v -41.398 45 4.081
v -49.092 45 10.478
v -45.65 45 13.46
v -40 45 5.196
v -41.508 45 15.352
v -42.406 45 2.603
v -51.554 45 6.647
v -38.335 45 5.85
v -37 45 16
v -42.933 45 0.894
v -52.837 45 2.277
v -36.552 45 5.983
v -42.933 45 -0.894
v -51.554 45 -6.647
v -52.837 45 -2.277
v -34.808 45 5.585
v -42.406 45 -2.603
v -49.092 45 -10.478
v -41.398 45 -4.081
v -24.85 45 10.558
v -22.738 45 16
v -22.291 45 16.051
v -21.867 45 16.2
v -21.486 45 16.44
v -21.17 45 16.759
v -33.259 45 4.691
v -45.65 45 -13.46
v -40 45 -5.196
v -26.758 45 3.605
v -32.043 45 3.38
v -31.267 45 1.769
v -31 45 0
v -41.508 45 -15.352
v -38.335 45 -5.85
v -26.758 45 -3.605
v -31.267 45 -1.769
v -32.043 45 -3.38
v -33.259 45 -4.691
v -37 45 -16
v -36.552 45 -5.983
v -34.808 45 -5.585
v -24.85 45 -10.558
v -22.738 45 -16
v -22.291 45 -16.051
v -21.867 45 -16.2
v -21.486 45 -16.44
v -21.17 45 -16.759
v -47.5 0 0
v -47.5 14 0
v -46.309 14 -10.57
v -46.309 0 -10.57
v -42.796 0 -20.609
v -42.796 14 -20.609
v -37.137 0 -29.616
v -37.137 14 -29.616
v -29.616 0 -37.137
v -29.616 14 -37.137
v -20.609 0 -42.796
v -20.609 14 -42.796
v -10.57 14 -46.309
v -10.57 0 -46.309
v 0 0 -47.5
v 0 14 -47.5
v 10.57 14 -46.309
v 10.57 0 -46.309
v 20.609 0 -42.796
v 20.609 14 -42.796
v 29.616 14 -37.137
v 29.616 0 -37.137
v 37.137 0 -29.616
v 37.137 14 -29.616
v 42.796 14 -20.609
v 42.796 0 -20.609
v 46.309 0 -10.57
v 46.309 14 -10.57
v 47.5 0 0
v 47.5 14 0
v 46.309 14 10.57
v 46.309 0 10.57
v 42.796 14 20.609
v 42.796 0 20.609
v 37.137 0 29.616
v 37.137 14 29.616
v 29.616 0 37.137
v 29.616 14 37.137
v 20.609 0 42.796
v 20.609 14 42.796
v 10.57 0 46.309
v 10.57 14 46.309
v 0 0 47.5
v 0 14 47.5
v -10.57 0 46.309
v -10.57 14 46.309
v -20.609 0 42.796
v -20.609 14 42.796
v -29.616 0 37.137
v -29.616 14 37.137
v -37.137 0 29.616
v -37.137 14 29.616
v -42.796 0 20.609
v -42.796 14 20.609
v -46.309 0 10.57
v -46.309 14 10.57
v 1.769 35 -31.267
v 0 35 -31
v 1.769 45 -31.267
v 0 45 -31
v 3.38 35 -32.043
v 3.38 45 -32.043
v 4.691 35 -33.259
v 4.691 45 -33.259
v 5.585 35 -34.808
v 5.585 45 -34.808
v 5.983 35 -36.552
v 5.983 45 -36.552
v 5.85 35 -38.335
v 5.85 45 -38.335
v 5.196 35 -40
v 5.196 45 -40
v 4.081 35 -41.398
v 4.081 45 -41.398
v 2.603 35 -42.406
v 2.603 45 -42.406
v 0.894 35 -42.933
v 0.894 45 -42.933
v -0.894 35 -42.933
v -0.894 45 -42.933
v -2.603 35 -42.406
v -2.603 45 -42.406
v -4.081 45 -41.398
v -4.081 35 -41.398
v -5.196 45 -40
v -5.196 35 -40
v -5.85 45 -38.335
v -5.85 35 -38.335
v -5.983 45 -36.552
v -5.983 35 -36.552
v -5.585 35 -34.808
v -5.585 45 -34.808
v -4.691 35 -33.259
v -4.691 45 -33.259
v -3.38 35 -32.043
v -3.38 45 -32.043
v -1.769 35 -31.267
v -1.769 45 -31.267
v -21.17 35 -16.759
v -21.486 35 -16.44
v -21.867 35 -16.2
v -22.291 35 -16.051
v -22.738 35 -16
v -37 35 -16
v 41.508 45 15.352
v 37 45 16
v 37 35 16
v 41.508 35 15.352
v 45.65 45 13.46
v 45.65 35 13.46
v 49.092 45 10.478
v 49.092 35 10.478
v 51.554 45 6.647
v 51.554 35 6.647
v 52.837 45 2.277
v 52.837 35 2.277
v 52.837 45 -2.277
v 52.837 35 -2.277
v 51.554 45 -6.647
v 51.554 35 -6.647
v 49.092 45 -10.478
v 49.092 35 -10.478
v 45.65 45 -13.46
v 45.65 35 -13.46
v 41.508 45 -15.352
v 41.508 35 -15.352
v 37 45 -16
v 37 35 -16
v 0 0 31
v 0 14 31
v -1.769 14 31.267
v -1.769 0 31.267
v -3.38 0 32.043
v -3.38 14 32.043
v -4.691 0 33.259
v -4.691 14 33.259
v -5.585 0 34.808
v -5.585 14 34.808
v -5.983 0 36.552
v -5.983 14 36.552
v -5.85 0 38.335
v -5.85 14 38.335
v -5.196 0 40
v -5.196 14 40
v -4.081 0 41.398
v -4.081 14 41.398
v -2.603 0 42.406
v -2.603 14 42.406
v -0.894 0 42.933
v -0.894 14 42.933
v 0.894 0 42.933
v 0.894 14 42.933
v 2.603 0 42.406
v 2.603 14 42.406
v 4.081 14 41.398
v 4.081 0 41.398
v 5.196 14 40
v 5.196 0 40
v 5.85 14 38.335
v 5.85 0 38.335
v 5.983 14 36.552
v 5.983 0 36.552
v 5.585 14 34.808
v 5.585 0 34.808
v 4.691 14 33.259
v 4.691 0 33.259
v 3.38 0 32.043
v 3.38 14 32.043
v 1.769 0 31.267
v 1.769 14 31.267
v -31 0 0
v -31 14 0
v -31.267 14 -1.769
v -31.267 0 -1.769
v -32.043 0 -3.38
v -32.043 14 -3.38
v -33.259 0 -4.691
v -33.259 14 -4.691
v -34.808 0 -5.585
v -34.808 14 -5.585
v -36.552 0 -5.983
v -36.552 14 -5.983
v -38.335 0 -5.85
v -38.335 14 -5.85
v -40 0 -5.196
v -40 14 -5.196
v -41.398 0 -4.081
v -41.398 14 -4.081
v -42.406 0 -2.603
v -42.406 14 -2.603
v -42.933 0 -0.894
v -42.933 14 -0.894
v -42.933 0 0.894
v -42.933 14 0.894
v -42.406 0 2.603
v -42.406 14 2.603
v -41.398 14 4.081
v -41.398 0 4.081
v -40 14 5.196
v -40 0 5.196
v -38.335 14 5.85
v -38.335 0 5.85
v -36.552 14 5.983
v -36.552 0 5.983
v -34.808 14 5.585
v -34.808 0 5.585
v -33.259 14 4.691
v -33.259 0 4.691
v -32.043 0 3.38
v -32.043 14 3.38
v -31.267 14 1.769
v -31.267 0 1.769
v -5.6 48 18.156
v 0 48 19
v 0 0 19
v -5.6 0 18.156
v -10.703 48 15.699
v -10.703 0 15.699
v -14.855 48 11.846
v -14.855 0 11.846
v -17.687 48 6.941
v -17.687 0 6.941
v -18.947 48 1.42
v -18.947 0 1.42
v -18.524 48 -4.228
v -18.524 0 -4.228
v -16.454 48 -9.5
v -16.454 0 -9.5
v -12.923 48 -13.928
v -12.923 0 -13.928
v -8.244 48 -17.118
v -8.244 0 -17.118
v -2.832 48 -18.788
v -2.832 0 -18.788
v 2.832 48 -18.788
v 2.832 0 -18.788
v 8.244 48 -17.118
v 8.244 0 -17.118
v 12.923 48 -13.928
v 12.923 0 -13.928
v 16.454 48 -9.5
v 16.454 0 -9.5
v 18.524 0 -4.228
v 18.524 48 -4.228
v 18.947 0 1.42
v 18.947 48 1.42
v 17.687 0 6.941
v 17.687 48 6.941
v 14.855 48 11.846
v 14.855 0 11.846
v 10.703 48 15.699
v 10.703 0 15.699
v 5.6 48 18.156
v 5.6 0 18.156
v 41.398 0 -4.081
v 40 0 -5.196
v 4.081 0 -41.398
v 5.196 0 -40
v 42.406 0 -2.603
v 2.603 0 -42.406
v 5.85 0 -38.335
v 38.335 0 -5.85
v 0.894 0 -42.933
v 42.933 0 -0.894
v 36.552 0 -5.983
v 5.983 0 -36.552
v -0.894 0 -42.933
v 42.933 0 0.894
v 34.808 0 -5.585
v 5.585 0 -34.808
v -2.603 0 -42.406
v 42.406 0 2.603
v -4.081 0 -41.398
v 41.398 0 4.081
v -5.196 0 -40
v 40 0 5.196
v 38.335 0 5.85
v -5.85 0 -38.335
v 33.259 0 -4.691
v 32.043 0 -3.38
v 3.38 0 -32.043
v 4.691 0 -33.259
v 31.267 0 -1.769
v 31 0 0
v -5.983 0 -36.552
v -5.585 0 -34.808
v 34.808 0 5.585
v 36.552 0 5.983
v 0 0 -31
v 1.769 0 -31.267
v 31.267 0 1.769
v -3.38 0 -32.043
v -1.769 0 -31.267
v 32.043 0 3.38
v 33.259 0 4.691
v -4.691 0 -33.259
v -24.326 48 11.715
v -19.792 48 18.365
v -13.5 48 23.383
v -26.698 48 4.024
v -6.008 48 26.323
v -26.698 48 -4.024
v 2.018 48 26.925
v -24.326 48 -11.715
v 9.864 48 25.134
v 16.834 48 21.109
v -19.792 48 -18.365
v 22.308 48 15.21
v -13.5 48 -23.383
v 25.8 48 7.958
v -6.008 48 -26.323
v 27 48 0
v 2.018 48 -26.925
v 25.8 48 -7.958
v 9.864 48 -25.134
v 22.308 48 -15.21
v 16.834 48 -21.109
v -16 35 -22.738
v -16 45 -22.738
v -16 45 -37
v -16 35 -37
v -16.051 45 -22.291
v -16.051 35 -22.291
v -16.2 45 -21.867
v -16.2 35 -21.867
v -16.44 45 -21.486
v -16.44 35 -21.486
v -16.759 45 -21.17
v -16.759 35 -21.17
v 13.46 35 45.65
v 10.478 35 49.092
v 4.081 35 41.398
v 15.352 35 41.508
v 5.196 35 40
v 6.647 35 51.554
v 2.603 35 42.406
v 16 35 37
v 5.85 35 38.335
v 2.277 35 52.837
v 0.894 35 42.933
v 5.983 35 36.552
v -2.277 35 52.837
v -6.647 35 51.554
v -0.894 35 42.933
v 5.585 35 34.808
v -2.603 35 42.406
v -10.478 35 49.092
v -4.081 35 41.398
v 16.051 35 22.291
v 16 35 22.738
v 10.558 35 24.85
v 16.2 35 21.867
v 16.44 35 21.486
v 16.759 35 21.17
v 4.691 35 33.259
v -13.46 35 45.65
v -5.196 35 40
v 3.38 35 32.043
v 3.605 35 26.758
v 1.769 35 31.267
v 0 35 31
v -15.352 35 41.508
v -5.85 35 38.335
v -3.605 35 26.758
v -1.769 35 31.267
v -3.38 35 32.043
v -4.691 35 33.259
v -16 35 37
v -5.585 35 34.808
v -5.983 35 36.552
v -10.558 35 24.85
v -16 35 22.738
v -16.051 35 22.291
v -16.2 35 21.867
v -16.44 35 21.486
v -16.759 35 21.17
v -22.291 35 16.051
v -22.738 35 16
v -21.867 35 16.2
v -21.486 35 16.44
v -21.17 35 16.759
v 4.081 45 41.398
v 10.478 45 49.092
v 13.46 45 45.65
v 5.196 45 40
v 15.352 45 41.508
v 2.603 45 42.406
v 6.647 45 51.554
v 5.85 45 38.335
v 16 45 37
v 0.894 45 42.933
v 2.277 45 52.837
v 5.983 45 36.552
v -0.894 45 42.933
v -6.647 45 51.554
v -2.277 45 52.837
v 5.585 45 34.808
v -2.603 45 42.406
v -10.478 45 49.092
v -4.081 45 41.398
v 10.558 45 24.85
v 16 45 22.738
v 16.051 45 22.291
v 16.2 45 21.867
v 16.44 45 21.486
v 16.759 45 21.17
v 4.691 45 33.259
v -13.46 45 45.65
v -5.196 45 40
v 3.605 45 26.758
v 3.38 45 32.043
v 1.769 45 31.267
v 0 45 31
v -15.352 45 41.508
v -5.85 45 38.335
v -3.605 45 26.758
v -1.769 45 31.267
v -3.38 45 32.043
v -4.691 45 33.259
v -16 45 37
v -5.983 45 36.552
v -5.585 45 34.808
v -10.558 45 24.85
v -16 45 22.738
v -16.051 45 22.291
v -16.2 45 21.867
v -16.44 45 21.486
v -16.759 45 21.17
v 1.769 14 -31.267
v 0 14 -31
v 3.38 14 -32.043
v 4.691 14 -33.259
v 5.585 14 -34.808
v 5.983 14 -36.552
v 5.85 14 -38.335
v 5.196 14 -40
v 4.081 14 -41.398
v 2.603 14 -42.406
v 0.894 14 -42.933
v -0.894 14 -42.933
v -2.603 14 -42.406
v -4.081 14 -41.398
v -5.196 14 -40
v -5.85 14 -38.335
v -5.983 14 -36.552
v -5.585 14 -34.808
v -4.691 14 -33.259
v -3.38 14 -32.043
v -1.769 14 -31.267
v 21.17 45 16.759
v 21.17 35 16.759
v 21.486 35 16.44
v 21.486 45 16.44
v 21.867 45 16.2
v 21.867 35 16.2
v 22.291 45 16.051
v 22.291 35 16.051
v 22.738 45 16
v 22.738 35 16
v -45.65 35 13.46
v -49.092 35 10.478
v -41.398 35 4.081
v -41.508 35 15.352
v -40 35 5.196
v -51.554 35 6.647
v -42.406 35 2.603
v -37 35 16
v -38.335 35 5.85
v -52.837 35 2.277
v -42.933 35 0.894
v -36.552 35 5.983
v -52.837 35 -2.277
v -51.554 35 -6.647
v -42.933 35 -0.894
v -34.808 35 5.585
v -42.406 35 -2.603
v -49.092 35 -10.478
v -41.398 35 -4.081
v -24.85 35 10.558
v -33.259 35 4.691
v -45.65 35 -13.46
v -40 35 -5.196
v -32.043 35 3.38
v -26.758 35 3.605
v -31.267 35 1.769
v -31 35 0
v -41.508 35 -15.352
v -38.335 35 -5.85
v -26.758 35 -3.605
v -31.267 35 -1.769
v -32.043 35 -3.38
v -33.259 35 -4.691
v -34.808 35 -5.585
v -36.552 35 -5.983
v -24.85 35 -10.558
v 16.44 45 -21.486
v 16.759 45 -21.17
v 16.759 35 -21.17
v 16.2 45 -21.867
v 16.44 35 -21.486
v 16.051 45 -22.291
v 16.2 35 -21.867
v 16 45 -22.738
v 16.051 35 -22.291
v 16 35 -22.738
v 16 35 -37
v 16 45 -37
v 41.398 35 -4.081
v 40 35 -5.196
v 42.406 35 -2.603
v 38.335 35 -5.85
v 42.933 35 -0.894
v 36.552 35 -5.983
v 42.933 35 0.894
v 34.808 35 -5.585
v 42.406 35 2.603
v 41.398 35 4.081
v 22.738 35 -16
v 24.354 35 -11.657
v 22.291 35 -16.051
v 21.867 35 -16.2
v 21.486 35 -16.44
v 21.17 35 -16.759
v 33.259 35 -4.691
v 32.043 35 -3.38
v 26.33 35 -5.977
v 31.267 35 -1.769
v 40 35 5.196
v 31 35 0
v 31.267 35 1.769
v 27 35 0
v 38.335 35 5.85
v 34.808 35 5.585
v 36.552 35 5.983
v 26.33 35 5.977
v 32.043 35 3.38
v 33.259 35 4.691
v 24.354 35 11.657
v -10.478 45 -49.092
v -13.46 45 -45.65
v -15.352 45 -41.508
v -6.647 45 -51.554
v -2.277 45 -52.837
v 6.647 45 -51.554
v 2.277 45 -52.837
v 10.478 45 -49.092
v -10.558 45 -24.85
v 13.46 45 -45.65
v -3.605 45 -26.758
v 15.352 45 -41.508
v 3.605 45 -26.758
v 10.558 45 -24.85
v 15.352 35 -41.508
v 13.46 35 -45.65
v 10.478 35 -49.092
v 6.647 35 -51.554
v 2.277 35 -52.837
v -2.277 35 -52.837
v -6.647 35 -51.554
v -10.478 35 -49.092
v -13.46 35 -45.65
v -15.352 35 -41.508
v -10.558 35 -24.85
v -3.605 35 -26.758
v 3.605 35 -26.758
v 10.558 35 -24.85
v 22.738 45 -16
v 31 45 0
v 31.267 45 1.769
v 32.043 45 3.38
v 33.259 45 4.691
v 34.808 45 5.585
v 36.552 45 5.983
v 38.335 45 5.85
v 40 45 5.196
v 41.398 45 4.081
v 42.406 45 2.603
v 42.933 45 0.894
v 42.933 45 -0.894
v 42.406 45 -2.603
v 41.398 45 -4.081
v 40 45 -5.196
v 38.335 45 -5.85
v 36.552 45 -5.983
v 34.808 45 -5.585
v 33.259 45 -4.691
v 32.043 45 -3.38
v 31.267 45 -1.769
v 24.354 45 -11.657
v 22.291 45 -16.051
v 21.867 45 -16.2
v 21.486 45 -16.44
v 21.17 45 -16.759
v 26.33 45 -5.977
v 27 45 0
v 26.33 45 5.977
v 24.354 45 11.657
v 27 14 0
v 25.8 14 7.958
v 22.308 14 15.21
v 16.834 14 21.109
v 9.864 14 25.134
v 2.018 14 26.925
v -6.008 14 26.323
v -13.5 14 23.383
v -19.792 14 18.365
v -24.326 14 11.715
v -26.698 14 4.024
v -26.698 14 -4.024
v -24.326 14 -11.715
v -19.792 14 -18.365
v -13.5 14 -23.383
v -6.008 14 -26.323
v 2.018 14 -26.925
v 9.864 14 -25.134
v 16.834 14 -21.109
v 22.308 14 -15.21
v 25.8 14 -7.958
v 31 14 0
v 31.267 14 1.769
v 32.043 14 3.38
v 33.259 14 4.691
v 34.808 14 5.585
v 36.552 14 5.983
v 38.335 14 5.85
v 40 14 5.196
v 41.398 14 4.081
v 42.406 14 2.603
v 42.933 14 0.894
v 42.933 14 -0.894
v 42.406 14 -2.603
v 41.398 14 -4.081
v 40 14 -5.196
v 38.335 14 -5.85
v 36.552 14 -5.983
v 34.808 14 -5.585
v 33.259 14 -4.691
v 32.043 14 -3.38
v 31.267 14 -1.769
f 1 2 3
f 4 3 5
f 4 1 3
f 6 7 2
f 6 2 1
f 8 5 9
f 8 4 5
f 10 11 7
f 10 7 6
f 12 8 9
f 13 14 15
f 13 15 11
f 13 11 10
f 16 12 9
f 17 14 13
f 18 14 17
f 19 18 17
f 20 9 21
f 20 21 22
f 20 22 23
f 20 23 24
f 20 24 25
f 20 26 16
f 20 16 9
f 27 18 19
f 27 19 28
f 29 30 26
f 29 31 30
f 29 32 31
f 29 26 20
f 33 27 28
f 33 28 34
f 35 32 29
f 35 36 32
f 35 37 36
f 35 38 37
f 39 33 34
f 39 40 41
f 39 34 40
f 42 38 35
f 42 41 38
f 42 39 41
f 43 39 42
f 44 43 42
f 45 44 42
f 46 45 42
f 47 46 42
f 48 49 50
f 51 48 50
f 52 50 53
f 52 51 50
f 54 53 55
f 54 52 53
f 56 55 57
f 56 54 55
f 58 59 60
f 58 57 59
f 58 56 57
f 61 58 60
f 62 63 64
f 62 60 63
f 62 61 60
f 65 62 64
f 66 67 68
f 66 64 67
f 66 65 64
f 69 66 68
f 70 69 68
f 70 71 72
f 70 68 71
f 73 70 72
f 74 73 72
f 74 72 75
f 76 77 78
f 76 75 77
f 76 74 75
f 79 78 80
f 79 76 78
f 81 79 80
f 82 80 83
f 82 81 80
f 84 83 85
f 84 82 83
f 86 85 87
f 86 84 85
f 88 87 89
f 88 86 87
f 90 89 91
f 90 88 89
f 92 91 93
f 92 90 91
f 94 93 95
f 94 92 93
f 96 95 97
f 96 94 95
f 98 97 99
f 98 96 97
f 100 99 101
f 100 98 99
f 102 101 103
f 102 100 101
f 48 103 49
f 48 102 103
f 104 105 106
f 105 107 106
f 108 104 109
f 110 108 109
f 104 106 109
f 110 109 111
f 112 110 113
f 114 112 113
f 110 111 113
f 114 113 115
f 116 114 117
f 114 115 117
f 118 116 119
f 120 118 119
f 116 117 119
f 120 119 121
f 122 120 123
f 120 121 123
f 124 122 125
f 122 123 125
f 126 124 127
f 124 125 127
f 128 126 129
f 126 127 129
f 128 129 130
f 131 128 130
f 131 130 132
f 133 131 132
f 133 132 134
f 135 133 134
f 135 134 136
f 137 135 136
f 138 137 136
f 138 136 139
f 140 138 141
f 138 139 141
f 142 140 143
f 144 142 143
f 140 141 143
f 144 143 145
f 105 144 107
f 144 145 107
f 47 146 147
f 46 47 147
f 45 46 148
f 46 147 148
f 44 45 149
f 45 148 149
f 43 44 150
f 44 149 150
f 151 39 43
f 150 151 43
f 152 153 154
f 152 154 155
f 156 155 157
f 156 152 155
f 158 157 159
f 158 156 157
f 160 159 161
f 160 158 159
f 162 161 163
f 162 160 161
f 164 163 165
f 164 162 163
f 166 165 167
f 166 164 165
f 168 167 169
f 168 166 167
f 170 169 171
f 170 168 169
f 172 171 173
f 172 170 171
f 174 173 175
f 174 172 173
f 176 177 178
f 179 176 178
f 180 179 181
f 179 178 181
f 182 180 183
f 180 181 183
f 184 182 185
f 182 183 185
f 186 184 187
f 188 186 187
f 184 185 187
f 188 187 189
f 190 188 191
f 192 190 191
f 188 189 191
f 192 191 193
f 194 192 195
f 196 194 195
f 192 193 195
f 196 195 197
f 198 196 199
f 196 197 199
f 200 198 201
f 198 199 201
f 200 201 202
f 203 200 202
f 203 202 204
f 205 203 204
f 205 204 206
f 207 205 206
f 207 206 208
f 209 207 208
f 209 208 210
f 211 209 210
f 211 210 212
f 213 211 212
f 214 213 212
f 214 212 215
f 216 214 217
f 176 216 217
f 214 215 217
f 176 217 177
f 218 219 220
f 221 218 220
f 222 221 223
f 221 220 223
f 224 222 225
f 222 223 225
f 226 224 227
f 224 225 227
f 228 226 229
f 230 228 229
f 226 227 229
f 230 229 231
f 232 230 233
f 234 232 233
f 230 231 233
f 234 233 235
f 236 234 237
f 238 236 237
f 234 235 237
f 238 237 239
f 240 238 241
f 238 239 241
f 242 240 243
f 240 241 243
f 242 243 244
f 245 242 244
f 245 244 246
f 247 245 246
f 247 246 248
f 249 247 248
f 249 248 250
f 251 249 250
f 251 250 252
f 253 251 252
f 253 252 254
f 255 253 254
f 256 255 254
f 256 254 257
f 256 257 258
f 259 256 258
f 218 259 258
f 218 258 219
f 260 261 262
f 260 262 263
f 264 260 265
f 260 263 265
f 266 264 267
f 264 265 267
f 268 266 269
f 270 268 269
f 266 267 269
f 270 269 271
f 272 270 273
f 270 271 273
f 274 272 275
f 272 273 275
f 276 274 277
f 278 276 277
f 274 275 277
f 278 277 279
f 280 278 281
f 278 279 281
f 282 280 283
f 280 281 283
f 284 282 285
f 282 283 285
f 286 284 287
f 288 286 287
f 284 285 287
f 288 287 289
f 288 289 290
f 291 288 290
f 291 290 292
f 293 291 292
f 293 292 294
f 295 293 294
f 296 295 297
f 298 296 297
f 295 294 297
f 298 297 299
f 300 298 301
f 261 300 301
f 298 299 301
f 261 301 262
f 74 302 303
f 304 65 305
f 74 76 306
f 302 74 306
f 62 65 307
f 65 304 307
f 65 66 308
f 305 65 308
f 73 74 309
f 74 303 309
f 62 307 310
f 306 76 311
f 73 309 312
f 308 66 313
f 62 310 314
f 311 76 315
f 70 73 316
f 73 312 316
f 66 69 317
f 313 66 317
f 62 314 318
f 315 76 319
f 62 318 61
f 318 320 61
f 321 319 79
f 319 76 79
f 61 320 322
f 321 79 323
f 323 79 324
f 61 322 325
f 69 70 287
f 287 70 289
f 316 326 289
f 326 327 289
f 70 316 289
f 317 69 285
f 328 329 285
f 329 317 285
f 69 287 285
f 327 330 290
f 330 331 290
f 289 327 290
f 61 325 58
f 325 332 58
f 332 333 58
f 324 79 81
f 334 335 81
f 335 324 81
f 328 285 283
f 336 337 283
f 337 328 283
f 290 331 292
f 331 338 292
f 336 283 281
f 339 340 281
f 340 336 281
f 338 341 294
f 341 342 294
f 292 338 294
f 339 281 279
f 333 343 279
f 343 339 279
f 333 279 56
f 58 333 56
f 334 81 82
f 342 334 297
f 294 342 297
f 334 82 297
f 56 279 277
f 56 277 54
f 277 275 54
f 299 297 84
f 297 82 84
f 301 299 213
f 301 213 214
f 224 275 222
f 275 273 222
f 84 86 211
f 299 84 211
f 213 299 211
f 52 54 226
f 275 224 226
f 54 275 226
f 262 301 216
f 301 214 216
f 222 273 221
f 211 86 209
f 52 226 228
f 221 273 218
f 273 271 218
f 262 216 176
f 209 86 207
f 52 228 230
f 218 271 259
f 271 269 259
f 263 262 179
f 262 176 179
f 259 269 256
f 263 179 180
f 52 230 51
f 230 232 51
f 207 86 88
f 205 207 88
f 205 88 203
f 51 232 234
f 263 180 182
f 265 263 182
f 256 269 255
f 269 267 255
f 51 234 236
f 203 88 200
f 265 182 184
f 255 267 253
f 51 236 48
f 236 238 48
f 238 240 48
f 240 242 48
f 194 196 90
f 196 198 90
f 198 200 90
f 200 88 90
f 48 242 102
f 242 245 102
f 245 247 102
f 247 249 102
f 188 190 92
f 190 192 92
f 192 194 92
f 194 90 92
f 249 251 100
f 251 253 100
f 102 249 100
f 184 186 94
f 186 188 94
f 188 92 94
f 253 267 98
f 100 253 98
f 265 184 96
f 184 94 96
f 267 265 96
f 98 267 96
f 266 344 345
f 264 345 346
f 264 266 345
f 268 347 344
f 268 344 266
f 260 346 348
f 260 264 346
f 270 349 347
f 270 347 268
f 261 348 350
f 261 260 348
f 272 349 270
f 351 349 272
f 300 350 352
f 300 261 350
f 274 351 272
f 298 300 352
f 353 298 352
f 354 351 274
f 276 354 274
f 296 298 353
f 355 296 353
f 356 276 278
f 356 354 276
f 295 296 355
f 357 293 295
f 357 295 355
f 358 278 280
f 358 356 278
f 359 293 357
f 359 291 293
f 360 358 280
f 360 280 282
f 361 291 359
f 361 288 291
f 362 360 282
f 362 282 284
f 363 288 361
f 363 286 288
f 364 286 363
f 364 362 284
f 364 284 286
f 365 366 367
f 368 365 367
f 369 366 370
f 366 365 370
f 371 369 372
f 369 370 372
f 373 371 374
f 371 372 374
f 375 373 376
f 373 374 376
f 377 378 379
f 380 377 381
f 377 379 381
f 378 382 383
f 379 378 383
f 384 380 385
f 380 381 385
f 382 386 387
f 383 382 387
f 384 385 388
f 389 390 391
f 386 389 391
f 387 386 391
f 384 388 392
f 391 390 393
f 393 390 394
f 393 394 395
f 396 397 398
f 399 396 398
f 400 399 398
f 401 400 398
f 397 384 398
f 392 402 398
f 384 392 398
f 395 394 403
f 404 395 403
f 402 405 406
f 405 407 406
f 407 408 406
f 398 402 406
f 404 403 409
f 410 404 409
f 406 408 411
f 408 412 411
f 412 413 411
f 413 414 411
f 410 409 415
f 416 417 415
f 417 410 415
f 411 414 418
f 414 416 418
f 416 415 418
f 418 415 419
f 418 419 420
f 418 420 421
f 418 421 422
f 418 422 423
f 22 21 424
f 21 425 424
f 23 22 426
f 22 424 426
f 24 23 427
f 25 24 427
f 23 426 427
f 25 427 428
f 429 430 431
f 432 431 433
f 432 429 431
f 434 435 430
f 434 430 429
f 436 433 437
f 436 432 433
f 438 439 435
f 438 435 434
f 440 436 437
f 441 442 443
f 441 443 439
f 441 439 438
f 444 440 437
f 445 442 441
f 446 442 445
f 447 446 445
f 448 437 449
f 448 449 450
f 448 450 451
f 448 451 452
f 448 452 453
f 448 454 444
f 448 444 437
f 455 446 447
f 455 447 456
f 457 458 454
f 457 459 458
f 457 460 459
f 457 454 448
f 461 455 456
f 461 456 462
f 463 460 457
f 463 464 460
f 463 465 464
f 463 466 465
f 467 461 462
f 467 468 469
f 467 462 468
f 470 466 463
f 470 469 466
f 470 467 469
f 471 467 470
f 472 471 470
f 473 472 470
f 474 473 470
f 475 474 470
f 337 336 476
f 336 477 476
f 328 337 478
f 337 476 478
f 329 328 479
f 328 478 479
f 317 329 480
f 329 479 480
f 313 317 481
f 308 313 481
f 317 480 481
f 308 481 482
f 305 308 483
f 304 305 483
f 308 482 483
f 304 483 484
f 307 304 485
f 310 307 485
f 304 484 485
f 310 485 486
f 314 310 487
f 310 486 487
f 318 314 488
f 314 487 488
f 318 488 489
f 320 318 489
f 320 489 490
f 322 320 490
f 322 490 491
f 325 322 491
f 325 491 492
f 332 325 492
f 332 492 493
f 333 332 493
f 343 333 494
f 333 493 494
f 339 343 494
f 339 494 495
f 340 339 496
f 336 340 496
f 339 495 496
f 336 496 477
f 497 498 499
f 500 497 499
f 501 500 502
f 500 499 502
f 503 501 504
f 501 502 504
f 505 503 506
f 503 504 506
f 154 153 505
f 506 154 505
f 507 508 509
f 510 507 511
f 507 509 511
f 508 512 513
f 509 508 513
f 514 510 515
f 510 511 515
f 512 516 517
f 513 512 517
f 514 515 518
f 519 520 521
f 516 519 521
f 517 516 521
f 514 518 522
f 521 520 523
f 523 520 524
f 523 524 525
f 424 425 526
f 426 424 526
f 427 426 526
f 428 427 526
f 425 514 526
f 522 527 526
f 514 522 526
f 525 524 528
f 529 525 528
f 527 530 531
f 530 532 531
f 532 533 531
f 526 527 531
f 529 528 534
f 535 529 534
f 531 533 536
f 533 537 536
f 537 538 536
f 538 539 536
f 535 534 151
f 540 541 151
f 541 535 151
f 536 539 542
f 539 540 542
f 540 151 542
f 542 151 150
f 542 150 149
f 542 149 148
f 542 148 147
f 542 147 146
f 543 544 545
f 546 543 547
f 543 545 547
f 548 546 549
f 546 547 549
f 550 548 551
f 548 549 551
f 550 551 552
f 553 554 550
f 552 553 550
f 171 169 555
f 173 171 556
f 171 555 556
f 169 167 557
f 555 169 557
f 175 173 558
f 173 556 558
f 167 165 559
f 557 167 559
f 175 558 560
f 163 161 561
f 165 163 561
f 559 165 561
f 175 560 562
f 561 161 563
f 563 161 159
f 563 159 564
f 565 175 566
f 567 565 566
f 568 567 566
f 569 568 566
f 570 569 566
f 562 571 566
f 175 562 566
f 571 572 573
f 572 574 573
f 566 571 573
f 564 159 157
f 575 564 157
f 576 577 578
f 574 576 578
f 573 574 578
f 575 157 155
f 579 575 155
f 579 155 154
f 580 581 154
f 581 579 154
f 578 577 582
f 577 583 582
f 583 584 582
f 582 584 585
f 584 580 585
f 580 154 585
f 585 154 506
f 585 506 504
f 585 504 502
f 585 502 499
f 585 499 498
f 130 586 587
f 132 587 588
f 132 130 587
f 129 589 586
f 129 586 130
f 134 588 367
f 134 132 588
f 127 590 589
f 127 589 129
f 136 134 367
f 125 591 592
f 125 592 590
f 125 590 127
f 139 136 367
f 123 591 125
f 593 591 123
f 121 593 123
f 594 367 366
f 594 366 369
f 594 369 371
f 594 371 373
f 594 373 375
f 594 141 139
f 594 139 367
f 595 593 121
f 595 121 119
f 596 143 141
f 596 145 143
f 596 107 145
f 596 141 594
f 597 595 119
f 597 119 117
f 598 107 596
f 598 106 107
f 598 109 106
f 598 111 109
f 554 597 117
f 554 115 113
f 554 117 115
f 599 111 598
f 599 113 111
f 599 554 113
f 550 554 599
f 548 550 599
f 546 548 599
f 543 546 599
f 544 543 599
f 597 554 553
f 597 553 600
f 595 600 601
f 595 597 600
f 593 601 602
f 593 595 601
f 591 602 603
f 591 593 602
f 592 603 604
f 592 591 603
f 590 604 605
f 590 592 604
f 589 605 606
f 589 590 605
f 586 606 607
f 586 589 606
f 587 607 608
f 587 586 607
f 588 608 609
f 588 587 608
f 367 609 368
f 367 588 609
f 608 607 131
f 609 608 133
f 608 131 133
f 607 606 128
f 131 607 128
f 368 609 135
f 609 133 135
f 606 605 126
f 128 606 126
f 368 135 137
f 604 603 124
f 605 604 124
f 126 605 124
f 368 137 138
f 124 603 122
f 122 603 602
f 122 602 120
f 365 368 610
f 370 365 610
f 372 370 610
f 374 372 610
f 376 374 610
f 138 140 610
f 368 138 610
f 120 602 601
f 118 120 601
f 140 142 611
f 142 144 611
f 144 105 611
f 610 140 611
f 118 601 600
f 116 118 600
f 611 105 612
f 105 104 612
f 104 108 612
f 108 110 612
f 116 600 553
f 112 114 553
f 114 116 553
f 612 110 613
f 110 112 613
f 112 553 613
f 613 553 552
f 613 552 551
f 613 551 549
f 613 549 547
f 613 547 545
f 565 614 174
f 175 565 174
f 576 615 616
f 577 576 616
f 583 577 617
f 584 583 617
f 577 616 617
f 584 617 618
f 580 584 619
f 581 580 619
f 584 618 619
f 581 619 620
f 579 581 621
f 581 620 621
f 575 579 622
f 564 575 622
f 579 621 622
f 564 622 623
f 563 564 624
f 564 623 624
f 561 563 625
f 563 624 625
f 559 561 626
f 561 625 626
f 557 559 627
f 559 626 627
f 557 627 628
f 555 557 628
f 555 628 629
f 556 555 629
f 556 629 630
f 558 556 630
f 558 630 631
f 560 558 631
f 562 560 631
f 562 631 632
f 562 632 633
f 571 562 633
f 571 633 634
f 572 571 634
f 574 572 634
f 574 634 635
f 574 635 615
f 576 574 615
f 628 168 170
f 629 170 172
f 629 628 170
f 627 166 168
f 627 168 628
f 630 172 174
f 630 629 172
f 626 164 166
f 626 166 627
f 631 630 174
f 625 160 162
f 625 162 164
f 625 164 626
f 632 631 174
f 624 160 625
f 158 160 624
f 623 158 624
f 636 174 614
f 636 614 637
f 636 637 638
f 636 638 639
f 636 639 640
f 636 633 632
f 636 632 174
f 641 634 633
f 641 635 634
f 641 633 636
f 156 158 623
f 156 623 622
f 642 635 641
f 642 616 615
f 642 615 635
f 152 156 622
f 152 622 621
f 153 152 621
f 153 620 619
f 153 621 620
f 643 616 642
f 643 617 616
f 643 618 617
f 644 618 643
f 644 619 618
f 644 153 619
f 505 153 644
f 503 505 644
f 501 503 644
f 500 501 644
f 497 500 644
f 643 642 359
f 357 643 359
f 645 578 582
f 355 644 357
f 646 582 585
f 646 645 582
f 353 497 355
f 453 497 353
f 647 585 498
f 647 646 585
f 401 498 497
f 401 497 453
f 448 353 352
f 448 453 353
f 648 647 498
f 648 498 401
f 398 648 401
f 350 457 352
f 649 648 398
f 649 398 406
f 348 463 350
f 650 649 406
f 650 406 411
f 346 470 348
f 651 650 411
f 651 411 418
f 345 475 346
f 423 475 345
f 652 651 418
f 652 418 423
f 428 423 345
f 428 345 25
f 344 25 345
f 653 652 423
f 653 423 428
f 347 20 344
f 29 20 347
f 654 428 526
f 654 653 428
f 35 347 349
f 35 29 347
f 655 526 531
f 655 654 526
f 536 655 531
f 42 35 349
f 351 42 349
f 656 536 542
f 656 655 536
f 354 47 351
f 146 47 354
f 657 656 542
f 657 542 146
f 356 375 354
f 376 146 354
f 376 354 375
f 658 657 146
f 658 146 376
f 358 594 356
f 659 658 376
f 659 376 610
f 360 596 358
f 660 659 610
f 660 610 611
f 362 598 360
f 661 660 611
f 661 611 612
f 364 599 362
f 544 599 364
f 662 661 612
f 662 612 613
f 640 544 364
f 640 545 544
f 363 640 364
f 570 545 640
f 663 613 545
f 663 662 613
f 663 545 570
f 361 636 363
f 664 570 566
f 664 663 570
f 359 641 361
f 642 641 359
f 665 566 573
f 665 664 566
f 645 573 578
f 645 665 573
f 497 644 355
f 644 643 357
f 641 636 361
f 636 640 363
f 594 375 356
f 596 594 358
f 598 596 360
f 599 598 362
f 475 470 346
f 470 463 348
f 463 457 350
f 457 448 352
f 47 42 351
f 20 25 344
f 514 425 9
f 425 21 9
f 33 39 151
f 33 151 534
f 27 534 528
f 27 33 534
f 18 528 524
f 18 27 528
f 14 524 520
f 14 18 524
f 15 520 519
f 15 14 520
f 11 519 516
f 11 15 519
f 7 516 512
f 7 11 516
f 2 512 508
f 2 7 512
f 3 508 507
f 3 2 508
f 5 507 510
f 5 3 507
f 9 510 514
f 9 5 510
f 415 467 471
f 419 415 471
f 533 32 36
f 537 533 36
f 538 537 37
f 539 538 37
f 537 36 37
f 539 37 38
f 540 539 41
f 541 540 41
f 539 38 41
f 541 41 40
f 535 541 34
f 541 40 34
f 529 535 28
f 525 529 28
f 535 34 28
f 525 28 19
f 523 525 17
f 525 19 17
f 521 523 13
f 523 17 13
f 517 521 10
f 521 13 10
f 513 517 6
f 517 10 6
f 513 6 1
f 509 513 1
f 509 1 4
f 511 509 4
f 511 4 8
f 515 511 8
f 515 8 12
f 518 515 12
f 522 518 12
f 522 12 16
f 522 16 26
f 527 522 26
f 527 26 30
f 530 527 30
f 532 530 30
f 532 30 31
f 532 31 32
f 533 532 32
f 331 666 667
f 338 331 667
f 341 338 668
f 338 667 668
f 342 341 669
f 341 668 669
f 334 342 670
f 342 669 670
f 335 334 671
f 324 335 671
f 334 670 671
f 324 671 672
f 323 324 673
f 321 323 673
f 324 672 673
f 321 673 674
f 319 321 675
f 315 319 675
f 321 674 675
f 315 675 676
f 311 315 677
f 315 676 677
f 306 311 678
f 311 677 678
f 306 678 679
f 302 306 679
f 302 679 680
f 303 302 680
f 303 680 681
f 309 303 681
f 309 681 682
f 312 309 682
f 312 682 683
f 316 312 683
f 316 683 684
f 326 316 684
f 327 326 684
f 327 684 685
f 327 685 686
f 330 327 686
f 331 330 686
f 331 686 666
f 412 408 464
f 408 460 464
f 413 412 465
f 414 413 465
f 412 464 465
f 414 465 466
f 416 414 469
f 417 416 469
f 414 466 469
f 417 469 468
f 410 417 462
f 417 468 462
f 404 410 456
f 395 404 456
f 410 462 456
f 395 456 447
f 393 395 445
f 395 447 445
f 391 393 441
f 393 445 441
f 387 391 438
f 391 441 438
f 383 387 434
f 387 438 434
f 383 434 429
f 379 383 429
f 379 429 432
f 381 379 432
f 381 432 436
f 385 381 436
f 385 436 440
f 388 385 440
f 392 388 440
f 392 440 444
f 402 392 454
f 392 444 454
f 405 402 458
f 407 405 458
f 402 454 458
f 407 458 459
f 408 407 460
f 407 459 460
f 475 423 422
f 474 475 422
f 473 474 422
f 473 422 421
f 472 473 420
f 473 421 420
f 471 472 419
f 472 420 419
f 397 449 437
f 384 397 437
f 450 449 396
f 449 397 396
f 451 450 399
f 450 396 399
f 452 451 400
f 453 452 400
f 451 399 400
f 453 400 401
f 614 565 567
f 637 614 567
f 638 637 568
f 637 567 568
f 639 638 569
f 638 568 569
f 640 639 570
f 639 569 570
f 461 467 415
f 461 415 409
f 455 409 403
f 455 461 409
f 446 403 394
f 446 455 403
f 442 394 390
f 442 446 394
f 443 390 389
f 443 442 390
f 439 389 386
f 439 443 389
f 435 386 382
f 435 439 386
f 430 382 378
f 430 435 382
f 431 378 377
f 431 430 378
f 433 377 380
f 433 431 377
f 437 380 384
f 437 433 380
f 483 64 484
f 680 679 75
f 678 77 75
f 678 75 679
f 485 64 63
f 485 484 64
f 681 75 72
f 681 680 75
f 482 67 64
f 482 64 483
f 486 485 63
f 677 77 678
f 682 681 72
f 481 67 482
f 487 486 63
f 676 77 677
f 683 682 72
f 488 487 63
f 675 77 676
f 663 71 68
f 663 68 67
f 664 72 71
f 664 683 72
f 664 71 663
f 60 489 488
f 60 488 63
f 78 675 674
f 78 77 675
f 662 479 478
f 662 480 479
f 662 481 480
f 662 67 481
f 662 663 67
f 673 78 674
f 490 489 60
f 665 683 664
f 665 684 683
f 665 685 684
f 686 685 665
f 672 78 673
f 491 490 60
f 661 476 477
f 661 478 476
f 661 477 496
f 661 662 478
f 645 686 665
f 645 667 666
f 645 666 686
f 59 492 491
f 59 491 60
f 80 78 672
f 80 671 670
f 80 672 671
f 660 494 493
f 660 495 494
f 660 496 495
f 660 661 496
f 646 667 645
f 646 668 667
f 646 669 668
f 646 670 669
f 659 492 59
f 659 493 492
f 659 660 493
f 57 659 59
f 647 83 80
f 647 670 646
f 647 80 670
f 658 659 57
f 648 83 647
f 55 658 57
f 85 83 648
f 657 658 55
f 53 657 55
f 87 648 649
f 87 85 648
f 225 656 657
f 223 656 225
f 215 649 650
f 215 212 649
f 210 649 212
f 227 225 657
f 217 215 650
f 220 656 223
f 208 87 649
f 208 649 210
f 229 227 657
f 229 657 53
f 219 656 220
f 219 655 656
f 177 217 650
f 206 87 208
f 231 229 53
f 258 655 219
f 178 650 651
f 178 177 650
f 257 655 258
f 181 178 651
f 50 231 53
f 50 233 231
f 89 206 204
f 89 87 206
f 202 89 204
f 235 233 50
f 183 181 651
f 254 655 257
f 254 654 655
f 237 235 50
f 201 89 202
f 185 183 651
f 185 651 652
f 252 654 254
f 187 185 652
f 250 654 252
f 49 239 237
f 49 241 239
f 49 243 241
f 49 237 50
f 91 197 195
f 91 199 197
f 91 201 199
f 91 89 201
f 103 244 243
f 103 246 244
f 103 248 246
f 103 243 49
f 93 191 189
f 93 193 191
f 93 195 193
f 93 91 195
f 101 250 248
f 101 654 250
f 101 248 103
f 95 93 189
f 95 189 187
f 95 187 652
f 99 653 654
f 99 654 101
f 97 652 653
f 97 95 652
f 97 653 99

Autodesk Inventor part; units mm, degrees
ref_plane "YZ Plane" through (0, 0, 0) normal (1, 0, 0) x (0, 1, 0)
ref_plane "XZ Plane" through (0, 0, 0) normal (0, 1, 0) x (-1, 0, 0)
sketch "Sketch1" plane through (0, 0, 0) normal (0, 1, 0) x (-1, 0, 0)
  circle A0 centre (0, 0) radius 47.5
  dimension "d0" = 95
extrude "Extrusion1" add sketch "Sketch1" along normal blind 14
sketch "Sketch2" plane through (0, 14, 0) normal (0, 1, 0) x (1, 0, 0)
  circle A0 centre (0, 0) radius 27
  dimension "d3" = 54
extrude "Extrusion2" add sketch "Sketch2" along normal blind 34
ref_plane "Work Plane1" through (0, 45, 0) normal (0, 1, 0) x (1, 0, 0)
sketch "Sketch3" plane through (0, 45, 0) normal (0, 1, 0) x (1, 0, 0)
  line L0 (0, 0) -> (-37, 0) construction
  line L1 (0, -16) -> (-37, -16)
  line L2 (-37, 16) -> (0, 16)
  arc A0 (0, -16) -> (0, 16) centre (0, 0) ccw
  arc A1 (-37, 16) -> (-37, -16) centre (-37, 0) ccw
  point P0 (-18.5, 0)
  dimension "d7" = 16
  dimension "d8" = 37
extrude "Extrusion3" add sketch "Sketch3" against normal blind 10
sketch "Sketch4" plane through (0, 45, 0) normal (0, 1, 0) x (1, 0, 0)
  arc A0 (-37, 16) -> (-37, -16) centre (-37, 0) ccw projected
  circle A1 centre (-37, 0) radius 6
  point P0 (0, 0)
  dimension "d11" = 12
extrude "Extrusion4" cut sketch "Sketch4" against normal through all
fillet "Fillet1" radius 2 2 edges at (-21.7486, 40, 16) (-21.7486, 40, -16)
pattern_circular "Circular Pattern1" count 4 over 360 about axis through (0, 14, 0) along (0, 1, 0) of "Extrusion3", "Extrusion4", "Fillet1"
sketch "Sketch5" plane through (0, 48, 0) normal (0, 1, 0) x (1, 0, 0)
  point P0 (0, 0)
  point P1 (0, 0)
hole "Hole1" at (0, 48, 0) direction (0, -1, 0) diameter 38 end through all
properties part number "lab11_1"
